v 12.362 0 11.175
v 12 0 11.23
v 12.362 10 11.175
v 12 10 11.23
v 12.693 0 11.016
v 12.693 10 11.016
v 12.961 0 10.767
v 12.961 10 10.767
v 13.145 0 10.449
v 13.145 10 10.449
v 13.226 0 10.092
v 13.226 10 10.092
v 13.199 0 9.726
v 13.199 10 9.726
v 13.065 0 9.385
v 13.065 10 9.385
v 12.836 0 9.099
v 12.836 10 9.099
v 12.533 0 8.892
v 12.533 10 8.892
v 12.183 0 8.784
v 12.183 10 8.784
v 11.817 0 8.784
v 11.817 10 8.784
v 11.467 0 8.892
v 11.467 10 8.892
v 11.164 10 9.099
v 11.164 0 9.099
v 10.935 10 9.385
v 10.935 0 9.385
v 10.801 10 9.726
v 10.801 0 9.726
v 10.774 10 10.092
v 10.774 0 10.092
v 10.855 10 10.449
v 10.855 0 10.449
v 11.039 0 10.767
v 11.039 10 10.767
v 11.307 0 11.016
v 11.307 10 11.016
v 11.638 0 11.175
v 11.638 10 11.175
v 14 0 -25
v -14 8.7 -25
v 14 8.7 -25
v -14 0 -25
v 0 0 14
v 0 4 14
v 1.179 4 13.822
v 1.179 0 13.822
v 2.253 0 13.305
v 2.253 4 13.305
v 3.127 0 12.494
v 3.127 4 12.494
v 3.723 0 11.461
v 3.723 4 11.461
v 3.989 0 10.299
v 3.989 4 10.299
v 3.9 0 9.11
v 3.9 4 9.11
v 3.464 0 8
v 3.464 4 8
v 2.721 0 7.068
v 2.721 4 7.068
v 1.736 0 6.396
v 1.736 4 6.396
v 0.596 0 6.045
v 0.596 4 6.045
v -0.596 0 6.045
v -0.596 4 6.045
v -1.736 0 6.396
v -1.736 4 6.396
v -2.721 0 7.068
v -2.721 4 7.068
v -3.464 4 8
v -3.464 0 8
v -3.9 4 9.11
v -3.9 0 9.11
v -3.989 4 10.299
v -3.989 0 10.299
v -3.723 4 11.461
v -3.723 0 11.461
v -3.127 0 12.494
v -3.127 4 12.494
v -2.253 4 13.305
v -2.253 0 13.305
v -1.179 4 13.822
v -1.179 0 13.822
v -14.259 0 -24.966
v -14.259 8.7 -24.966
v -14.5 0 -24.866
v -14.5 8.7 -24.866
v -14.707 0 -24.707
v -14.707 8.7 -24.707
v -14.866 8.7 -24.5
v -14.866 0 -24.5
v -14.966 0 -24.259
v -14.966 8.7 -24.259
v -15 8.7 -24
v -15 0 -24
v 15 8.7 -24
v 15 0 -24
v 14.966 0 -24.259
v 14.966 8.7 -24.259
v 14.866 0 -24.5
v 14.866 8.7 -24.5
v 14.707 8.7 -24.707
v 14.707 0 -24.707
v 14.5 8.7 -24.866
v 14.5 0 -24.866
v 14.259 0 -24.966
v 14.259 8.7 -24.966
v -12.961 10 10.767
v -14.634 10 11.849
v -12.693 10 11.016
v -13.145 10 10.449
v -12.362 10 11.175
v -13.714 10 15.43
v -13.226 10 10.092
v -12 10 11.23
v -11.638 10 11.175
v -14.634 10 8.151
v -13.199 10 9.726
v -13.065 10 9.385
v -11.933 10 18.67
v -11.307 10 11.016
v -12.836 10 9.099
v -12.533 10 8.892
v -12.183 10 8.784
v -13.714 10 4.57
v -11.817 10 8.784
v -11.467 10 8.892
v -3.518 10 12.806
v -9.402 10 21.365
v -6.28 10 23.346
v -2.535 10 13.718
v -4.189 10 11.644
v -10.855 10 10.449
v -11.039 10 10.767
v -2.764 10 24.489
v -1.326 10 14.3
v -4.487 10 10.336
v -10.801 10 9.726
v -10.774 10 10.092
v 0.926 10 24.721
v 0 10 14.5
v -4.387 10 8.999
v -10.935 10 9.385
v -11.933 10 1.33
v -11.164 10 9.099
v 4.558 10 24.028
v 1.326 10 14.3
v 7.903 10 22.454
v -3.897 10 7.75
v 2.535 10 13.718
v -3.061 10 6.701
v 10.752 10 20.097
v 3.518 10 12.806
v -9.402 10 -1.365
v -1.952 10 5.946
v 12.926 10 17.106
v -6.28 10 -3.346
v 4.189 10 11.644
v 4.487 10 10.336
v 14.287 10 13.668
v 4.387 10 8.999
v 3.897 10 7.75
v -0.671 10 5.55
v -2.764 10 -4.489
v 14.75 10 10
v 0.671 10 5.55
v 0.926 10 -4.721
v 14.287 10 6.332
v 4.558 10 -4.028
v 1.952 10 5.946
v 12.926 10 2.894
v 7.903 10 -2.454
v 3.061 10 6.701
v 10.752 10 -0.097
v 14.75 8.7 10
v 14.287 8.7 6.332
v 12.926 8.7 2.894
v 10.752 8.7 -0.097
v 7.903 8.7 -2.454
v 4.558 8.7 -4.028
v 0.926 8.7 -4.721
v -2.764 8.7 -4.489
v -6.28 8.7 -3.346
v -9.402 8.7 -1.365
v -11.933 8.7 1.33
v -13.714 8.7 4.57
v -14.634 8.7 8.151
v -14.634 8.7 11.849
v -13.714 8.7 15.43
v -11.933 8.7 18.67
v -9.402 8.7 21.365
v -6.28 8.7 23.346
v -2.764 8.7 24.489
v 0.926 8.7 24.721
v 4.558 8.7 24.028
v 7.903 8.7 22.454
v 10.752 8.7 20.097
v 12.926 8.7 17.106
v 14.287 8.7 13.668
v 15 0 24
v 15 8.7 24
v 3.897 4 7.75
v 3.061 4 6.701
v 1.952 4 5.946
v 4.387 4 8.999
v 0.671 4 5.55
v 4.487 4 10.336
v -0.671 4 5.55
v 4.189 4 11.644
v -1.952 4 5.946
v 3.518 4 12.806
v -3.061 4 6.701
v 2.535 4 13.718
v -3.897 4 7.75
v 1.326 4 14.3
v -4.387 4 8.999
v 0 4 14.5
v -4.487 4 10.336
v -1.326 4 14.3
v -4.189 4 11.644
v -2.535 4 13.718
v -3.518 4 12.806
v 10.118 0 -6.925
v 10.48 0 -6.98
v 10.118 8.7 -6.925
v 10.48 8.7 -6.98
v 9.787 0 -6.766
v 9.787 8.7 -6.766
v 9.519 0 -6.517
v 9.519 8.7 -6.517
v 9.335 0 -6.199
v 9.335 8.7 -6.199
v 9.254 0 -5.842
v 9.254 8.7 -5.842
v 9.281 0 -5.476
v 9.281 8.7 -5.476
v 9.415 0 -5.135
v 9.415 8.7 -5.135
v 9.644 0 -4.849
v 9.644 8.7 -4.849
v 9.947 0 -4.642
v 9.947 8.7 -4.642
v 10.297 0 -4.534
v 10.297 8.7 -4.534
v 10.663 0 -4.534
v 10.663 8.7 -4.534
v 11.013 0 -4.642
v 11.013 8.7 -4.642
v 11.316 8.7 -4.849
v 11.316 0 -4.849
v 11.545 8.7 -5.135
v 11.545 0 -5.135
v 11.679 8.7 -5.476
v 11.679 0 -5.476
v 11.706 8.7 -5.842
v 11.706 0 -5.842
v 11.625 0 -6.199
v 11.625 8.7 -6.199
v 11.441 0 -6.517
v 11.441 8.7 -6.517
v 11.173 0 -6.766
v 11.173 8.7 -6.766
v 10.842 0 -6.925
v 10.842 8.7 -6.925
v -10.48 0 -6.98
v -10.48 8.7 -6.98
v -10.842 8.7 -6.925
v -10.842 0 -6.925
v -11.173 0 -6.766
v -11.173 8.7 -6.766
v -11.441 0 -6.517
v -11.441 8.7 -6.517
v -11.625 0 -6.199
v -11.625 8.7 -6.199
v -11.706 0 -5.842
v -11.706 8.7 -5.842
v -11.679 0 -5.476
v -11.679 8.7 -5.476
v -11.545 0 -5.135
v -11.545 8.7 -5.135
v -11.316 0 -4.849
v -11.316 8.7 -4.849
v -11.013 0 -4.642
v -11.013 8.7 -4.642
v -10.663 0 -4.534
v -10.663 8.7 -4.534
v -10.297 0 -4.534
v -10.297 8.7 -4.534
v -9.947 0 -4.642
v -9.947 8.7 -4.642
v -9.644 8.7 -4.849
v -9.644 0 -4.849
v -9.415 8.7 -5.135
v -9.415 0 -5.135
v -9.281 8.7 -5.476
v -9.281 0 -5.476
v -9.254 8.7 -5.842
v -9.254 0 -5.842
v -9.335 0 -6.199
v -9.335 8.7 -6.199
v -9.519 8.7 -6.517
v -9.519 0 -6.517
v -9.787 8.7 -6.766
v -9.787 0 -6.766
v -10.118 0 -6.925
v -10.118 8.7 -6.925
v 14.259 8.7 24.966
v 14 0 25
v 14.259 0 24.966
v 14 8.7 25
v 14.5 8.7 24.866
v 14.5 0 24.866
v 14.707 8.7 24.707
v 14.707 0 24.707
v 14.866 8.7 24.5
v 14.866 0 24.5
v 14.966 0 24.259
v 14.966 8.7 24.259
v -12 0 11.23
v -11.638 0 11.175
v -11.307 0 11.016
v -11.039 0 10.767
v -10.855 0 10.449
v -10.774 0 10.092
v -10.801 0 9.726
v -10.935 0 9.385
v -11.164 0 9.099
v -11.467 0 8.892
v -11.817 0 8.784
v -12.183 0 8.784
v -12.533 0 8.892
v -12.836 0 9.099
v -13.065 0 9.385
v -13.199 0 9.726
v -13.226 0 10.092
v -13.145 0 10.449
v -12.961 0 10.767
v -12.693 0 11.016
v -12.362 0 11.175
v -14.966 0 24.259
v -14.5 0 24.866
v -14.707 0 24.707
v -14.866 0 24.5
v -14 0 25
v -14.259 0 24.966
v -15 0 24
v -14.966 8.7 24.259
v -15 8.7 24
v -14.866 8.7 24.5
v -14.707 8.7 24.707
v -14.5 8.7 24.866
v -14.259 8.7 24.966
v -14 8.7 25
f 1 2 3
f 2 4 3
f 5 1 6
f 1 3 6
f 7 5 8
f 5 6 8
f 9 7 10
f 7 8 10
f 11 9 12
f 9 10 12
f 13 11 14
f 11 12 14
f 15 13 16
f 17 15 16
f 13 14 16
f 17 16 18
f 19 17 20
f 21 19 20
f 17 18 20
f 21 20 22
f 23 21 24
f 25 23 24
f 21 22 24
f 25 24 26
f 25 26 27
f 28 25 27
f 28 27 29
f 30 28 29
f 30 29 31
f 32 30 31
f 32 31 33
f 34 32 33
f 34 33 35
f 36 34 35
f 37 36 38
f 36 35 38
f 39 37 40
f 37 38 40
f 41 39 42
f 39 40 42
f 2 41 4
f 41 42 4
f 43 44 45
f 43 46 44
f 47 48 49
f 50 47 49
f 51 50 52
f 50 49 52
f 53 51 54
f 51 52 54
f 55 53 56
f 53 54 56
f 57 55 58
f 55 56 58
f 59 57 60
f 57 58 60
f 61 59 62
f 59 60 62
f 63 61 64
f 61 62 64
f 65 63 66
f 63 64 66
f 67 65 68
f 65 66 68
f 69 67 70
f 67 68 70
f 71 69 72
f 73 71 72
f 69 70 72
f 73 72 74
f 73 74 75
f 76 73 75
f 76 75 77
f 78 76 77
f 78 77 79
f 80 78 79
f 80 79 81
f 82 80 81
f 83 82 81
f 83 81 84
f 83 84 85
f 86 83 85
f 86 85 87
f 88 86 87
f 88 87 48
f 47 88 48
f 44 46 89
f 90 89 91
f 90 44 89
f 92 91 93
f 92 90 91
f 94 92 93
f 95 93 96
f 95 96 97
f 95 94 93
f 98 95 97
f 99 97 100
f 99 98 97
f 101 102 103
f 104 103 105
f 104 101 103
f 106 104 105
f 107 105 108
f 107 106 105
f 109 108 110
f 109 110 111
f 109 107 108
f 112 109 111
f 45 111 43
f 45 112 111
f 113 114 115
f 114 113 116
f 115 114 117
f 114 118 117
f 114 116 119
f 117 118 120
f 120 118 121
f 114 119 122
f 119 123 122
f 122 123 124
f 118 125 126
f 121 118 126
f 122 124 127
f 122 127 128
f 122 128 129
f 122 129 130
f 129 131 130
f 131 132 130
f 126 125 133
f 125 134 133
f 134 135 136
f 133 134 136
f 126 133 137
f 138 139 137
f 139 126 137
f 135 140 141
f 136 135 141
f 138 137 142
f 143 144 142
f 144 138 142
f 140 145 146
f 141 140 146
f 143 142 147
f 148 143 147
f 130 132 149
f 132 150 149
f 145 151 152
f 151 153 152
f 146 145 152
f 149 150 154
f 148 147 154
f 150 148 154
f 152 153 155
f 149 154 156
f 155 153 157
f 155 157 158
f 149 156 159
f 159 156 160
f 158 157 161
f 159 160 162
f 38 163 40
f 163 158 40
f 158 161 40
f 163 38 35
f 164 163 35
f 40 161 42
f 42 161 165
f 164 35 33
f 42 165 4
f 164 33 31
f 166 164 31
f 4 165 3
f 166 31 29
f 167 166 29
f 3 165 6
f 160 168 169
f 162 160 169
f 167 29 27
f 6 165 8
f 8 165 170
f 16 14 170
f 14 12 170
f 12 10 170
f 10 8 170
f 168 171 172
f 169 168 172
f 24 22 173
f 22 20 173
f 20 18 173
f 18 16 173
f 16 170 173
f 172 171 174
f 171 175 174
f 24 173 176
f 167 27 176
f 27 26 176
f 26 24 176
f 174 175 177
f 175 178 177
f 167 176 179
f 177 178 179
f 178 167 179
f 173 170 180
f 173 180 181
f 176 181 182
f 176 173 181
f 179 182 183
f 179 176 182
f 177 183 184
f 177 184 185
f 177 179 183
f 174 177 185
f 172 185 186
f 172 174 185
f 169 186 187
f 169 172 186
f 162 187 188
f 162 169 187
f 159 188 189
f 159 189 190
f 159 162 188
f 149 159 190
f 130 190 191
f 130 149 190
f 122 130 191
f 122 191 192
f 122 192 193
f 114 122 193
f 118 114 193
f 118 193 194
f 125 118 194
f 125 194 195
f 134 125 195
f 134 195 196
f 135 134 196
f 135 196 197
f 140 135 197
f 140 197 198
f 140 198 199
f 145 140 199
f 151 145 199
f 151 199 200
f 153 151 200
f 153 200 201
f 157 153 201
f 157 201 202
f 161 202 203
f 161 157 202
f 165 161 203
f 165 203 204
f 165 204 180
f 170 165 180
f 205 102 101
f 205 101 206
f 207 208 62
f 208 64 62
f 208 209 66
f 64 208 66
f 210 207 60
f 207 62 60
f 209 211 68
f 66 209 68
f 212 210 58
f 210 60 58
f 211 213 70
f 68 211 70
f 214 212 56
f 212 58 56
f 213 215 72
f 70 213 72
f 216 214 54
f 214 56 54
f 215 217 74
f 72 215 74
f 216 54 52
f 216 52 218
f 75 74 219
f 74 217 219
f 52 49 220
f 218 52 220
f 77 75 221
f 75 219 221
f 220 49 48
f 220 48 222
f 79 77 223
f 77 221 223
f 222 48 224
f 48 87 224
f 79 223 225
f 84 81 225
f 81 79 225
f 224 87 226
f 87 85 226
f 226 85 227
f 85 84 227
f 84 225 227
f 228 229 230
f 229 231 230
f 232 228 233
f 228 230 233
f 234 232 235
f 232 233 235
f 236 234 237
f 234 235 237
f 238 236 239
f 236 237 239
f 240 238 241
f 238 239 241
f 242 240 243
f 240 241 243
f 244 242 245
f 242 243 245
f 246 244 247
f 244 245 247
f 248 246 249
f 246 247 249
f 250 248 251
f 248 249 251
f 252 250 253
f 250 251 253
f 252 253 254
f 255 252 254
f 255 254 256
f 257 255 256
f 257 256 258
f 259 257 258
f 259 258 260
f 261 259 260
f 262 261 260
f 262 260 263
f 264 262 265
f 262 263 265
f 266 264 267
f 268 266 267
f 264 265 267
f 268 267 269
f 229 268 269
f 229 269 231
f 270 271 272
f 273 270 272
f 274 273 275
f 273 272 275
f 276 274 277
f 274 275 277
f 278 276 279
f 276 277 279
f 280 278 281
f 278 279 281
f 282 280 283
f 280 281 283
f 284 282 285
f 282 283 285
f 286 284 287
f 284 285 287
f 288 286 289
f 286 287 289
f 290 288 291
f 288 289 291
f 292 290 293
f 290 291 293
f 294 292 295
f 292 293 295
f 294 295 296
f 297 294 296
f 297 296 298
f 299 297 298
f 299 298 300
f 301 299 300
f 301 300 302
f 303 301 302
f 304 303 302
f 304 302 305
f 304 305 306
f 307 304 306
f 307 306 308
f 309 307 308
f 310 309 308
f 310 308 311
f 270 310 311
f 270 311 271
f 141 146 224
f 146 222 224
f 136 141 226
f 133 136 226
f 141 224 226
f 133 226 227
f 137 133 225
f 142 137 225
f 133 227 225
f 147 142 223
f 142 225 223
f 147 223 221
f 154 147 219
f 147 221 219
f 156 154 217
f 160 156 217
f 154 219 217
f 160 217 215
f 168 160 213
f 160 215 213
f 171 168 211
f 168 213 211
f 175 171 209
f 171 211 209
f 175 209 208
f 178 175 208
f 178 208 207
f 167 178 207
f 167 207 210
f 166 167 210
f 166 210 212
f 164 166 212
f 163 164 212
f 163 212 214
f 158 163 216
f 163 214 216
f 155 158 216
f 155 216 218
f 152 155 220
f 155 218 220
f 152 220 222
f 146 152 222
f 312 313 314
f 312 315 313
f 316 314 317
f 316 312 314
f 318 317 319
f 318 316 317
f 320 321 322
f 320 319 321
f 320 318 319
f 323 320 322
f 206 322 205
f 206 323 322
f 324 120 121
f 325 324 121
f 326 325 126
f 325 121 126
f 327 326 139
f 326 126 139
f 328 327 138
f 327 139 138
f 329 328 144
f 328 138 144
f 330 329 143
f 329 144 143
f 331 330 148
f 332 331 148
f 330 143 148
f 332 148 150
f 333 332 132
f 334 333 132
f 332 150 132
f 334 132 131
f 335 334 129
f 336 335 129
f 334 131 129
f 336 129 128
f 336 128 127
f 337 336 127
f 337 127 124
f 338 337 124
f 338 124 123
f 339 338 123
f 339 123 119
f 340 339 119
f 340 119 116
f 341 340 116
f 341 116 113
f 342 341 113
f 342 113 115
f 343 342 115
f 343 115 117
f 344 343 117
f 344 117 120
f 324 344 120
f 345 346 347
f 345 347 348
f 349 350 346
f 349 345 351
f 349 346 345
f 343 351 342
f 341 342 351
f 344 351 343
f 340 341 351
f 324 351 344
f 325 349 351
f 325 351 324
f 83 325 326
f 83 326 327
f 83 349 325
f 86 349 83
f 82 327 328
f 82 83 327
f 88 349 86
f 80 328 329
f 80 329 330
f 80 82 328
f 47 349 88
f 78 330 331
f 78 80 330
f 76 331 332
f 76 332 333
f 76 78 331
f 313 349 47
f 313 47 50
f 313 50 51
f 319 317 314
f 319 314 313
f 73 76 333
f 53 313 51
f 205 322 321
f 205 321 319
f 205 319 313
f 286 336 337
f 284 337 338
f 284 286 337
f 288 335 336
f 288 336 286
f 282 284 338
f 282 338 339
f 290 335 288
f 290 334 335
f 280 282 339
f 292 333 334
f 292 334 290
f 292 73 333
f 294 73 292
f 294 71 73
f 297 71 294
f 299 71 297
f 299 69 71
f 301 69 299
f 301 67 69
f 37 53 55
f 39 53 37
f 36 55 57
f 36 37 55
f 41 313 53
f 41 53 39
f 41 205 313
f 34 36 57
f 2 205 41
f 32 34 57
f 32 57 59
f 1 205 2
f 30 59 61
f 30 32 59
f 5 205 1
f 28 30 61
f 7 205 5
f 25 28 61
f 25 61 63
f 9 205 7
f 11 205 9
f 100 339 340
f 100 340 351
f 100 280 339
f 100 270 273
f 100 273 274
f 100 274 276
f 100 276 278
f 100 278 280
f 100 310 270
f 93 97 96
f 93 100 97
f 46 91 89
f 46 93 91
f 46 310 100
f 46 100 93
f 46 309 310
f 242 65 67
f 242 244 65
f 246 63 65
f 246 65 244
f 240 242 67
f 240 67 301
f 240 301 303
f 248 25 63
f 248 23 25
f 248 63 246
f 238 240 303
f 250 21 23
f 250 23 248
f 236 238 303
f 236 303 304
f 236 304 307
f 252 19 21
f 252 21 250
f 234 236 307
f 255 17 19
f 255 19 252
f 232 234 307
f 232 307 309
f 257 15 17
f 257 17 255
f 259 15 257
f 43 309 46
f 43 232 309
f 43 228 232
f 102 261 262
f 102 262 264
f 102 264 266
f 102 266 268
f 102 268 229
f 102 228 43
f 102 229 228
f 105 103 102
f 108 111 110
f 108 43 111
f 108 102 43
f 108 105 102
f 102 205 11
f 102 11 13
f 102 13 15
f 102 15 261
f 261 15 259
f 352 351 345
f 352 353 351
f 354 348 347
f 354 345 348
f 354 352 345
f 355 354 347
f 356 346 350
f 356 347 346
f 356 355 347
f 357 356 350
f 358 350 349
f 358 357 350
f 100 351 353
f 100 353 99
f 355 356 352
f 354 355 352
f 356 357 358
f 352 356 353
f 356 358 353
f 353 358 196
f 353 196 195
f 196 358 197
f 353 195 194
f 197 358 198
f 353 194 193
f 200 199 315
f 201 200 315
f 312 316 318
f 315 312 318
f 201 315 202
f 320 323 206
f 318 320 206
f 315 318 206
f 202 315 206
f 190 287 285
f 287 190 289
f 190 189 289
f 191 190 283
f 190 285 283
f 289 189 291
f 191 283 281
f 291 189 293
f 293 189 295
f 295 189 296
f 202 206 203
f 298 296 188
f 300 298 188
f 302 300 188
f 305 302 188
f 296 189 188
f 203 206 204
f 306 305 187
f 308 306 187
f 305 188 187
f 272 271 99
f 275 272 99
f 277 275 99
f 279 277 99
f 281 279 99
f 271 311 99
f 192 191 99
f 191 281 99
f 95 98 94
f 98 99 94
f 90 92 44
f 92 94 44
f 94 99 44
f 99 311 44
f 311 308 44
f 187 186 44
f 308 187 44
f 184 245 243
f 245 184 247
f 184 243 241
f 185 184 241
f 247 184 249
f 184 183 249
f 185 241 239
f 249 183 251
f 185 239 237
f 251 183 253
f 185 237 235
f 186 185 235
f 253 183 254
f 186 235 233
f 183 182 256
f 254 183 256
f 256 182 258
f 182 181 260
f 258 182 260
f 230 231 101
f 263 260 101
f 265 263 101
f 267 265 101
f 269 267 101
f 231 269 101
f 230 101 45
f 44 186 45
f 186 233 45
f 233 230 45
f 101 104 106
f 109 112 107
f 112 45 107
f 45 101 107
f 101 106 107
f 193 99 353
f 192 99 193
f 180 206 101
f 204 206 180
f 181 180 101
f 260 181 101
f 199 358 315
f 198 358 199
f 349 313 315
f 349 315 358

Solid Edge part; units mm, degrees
sketch "Sketch1" plane through (0, 0, 0) normal (0, -1, 0) x (1, 0, 0)
  line L0 (15, -25) -> (15, 25)
  line L1 (15, 25) -> (-15, 25)
  line L2 (-15, 25) -> (-15, -25)
  line L3 (-15, -25) -> (15, -25)
extrude "Protrusion1" add sketch "Sketch1" against normal blind 10
hole "Bohrung_1" at (0, 10, 10) direction (0, -1, 0) diameter 8 end through all counterbore diameter 9 counterbore depth 6
sketch "Sketch2" plane through (0, 10, 0) normal (0, 1, 0) x (1, 0, 0)
  line L0 (-15, 25) -> (15, 25)
  line L1 (15, 25) -> (15, -25)
  line L2 (15, -25) -> (-15, -25)
  line L3 (-15, -25) -> (-15, 25)
  circle A0 centre (0, -10) radius 14.75
extrude "Extrusionsausprägung_2" cut sketch "Sketch2" against normal blind 1.3
fillet "Verrundung_1" radius 1 4 edges at (-15, 4.35, 25) (15, 4.35, 25) (15, 4.35, -25) (-15, 4.35, -25)
hole "Bohrung_2" at (-12, 10, 10) direction (0, -1, 0) diameter 2.459 end through all
hole "Hole1" at (12, 10, 10) direction (0, -1, 0) diameter 2.459 end through all
hole "Bohrung_4" at (10.48, 0, -5.75) direction (0, 1, 0) diameter 2.459 depth 15 thread major 3 thread length 10
hole "Hole2" at (-10.48, 0, -5.75) direction (0, 1, 0) diameter 2.459 depth 15 thread major 3 thread length 10
